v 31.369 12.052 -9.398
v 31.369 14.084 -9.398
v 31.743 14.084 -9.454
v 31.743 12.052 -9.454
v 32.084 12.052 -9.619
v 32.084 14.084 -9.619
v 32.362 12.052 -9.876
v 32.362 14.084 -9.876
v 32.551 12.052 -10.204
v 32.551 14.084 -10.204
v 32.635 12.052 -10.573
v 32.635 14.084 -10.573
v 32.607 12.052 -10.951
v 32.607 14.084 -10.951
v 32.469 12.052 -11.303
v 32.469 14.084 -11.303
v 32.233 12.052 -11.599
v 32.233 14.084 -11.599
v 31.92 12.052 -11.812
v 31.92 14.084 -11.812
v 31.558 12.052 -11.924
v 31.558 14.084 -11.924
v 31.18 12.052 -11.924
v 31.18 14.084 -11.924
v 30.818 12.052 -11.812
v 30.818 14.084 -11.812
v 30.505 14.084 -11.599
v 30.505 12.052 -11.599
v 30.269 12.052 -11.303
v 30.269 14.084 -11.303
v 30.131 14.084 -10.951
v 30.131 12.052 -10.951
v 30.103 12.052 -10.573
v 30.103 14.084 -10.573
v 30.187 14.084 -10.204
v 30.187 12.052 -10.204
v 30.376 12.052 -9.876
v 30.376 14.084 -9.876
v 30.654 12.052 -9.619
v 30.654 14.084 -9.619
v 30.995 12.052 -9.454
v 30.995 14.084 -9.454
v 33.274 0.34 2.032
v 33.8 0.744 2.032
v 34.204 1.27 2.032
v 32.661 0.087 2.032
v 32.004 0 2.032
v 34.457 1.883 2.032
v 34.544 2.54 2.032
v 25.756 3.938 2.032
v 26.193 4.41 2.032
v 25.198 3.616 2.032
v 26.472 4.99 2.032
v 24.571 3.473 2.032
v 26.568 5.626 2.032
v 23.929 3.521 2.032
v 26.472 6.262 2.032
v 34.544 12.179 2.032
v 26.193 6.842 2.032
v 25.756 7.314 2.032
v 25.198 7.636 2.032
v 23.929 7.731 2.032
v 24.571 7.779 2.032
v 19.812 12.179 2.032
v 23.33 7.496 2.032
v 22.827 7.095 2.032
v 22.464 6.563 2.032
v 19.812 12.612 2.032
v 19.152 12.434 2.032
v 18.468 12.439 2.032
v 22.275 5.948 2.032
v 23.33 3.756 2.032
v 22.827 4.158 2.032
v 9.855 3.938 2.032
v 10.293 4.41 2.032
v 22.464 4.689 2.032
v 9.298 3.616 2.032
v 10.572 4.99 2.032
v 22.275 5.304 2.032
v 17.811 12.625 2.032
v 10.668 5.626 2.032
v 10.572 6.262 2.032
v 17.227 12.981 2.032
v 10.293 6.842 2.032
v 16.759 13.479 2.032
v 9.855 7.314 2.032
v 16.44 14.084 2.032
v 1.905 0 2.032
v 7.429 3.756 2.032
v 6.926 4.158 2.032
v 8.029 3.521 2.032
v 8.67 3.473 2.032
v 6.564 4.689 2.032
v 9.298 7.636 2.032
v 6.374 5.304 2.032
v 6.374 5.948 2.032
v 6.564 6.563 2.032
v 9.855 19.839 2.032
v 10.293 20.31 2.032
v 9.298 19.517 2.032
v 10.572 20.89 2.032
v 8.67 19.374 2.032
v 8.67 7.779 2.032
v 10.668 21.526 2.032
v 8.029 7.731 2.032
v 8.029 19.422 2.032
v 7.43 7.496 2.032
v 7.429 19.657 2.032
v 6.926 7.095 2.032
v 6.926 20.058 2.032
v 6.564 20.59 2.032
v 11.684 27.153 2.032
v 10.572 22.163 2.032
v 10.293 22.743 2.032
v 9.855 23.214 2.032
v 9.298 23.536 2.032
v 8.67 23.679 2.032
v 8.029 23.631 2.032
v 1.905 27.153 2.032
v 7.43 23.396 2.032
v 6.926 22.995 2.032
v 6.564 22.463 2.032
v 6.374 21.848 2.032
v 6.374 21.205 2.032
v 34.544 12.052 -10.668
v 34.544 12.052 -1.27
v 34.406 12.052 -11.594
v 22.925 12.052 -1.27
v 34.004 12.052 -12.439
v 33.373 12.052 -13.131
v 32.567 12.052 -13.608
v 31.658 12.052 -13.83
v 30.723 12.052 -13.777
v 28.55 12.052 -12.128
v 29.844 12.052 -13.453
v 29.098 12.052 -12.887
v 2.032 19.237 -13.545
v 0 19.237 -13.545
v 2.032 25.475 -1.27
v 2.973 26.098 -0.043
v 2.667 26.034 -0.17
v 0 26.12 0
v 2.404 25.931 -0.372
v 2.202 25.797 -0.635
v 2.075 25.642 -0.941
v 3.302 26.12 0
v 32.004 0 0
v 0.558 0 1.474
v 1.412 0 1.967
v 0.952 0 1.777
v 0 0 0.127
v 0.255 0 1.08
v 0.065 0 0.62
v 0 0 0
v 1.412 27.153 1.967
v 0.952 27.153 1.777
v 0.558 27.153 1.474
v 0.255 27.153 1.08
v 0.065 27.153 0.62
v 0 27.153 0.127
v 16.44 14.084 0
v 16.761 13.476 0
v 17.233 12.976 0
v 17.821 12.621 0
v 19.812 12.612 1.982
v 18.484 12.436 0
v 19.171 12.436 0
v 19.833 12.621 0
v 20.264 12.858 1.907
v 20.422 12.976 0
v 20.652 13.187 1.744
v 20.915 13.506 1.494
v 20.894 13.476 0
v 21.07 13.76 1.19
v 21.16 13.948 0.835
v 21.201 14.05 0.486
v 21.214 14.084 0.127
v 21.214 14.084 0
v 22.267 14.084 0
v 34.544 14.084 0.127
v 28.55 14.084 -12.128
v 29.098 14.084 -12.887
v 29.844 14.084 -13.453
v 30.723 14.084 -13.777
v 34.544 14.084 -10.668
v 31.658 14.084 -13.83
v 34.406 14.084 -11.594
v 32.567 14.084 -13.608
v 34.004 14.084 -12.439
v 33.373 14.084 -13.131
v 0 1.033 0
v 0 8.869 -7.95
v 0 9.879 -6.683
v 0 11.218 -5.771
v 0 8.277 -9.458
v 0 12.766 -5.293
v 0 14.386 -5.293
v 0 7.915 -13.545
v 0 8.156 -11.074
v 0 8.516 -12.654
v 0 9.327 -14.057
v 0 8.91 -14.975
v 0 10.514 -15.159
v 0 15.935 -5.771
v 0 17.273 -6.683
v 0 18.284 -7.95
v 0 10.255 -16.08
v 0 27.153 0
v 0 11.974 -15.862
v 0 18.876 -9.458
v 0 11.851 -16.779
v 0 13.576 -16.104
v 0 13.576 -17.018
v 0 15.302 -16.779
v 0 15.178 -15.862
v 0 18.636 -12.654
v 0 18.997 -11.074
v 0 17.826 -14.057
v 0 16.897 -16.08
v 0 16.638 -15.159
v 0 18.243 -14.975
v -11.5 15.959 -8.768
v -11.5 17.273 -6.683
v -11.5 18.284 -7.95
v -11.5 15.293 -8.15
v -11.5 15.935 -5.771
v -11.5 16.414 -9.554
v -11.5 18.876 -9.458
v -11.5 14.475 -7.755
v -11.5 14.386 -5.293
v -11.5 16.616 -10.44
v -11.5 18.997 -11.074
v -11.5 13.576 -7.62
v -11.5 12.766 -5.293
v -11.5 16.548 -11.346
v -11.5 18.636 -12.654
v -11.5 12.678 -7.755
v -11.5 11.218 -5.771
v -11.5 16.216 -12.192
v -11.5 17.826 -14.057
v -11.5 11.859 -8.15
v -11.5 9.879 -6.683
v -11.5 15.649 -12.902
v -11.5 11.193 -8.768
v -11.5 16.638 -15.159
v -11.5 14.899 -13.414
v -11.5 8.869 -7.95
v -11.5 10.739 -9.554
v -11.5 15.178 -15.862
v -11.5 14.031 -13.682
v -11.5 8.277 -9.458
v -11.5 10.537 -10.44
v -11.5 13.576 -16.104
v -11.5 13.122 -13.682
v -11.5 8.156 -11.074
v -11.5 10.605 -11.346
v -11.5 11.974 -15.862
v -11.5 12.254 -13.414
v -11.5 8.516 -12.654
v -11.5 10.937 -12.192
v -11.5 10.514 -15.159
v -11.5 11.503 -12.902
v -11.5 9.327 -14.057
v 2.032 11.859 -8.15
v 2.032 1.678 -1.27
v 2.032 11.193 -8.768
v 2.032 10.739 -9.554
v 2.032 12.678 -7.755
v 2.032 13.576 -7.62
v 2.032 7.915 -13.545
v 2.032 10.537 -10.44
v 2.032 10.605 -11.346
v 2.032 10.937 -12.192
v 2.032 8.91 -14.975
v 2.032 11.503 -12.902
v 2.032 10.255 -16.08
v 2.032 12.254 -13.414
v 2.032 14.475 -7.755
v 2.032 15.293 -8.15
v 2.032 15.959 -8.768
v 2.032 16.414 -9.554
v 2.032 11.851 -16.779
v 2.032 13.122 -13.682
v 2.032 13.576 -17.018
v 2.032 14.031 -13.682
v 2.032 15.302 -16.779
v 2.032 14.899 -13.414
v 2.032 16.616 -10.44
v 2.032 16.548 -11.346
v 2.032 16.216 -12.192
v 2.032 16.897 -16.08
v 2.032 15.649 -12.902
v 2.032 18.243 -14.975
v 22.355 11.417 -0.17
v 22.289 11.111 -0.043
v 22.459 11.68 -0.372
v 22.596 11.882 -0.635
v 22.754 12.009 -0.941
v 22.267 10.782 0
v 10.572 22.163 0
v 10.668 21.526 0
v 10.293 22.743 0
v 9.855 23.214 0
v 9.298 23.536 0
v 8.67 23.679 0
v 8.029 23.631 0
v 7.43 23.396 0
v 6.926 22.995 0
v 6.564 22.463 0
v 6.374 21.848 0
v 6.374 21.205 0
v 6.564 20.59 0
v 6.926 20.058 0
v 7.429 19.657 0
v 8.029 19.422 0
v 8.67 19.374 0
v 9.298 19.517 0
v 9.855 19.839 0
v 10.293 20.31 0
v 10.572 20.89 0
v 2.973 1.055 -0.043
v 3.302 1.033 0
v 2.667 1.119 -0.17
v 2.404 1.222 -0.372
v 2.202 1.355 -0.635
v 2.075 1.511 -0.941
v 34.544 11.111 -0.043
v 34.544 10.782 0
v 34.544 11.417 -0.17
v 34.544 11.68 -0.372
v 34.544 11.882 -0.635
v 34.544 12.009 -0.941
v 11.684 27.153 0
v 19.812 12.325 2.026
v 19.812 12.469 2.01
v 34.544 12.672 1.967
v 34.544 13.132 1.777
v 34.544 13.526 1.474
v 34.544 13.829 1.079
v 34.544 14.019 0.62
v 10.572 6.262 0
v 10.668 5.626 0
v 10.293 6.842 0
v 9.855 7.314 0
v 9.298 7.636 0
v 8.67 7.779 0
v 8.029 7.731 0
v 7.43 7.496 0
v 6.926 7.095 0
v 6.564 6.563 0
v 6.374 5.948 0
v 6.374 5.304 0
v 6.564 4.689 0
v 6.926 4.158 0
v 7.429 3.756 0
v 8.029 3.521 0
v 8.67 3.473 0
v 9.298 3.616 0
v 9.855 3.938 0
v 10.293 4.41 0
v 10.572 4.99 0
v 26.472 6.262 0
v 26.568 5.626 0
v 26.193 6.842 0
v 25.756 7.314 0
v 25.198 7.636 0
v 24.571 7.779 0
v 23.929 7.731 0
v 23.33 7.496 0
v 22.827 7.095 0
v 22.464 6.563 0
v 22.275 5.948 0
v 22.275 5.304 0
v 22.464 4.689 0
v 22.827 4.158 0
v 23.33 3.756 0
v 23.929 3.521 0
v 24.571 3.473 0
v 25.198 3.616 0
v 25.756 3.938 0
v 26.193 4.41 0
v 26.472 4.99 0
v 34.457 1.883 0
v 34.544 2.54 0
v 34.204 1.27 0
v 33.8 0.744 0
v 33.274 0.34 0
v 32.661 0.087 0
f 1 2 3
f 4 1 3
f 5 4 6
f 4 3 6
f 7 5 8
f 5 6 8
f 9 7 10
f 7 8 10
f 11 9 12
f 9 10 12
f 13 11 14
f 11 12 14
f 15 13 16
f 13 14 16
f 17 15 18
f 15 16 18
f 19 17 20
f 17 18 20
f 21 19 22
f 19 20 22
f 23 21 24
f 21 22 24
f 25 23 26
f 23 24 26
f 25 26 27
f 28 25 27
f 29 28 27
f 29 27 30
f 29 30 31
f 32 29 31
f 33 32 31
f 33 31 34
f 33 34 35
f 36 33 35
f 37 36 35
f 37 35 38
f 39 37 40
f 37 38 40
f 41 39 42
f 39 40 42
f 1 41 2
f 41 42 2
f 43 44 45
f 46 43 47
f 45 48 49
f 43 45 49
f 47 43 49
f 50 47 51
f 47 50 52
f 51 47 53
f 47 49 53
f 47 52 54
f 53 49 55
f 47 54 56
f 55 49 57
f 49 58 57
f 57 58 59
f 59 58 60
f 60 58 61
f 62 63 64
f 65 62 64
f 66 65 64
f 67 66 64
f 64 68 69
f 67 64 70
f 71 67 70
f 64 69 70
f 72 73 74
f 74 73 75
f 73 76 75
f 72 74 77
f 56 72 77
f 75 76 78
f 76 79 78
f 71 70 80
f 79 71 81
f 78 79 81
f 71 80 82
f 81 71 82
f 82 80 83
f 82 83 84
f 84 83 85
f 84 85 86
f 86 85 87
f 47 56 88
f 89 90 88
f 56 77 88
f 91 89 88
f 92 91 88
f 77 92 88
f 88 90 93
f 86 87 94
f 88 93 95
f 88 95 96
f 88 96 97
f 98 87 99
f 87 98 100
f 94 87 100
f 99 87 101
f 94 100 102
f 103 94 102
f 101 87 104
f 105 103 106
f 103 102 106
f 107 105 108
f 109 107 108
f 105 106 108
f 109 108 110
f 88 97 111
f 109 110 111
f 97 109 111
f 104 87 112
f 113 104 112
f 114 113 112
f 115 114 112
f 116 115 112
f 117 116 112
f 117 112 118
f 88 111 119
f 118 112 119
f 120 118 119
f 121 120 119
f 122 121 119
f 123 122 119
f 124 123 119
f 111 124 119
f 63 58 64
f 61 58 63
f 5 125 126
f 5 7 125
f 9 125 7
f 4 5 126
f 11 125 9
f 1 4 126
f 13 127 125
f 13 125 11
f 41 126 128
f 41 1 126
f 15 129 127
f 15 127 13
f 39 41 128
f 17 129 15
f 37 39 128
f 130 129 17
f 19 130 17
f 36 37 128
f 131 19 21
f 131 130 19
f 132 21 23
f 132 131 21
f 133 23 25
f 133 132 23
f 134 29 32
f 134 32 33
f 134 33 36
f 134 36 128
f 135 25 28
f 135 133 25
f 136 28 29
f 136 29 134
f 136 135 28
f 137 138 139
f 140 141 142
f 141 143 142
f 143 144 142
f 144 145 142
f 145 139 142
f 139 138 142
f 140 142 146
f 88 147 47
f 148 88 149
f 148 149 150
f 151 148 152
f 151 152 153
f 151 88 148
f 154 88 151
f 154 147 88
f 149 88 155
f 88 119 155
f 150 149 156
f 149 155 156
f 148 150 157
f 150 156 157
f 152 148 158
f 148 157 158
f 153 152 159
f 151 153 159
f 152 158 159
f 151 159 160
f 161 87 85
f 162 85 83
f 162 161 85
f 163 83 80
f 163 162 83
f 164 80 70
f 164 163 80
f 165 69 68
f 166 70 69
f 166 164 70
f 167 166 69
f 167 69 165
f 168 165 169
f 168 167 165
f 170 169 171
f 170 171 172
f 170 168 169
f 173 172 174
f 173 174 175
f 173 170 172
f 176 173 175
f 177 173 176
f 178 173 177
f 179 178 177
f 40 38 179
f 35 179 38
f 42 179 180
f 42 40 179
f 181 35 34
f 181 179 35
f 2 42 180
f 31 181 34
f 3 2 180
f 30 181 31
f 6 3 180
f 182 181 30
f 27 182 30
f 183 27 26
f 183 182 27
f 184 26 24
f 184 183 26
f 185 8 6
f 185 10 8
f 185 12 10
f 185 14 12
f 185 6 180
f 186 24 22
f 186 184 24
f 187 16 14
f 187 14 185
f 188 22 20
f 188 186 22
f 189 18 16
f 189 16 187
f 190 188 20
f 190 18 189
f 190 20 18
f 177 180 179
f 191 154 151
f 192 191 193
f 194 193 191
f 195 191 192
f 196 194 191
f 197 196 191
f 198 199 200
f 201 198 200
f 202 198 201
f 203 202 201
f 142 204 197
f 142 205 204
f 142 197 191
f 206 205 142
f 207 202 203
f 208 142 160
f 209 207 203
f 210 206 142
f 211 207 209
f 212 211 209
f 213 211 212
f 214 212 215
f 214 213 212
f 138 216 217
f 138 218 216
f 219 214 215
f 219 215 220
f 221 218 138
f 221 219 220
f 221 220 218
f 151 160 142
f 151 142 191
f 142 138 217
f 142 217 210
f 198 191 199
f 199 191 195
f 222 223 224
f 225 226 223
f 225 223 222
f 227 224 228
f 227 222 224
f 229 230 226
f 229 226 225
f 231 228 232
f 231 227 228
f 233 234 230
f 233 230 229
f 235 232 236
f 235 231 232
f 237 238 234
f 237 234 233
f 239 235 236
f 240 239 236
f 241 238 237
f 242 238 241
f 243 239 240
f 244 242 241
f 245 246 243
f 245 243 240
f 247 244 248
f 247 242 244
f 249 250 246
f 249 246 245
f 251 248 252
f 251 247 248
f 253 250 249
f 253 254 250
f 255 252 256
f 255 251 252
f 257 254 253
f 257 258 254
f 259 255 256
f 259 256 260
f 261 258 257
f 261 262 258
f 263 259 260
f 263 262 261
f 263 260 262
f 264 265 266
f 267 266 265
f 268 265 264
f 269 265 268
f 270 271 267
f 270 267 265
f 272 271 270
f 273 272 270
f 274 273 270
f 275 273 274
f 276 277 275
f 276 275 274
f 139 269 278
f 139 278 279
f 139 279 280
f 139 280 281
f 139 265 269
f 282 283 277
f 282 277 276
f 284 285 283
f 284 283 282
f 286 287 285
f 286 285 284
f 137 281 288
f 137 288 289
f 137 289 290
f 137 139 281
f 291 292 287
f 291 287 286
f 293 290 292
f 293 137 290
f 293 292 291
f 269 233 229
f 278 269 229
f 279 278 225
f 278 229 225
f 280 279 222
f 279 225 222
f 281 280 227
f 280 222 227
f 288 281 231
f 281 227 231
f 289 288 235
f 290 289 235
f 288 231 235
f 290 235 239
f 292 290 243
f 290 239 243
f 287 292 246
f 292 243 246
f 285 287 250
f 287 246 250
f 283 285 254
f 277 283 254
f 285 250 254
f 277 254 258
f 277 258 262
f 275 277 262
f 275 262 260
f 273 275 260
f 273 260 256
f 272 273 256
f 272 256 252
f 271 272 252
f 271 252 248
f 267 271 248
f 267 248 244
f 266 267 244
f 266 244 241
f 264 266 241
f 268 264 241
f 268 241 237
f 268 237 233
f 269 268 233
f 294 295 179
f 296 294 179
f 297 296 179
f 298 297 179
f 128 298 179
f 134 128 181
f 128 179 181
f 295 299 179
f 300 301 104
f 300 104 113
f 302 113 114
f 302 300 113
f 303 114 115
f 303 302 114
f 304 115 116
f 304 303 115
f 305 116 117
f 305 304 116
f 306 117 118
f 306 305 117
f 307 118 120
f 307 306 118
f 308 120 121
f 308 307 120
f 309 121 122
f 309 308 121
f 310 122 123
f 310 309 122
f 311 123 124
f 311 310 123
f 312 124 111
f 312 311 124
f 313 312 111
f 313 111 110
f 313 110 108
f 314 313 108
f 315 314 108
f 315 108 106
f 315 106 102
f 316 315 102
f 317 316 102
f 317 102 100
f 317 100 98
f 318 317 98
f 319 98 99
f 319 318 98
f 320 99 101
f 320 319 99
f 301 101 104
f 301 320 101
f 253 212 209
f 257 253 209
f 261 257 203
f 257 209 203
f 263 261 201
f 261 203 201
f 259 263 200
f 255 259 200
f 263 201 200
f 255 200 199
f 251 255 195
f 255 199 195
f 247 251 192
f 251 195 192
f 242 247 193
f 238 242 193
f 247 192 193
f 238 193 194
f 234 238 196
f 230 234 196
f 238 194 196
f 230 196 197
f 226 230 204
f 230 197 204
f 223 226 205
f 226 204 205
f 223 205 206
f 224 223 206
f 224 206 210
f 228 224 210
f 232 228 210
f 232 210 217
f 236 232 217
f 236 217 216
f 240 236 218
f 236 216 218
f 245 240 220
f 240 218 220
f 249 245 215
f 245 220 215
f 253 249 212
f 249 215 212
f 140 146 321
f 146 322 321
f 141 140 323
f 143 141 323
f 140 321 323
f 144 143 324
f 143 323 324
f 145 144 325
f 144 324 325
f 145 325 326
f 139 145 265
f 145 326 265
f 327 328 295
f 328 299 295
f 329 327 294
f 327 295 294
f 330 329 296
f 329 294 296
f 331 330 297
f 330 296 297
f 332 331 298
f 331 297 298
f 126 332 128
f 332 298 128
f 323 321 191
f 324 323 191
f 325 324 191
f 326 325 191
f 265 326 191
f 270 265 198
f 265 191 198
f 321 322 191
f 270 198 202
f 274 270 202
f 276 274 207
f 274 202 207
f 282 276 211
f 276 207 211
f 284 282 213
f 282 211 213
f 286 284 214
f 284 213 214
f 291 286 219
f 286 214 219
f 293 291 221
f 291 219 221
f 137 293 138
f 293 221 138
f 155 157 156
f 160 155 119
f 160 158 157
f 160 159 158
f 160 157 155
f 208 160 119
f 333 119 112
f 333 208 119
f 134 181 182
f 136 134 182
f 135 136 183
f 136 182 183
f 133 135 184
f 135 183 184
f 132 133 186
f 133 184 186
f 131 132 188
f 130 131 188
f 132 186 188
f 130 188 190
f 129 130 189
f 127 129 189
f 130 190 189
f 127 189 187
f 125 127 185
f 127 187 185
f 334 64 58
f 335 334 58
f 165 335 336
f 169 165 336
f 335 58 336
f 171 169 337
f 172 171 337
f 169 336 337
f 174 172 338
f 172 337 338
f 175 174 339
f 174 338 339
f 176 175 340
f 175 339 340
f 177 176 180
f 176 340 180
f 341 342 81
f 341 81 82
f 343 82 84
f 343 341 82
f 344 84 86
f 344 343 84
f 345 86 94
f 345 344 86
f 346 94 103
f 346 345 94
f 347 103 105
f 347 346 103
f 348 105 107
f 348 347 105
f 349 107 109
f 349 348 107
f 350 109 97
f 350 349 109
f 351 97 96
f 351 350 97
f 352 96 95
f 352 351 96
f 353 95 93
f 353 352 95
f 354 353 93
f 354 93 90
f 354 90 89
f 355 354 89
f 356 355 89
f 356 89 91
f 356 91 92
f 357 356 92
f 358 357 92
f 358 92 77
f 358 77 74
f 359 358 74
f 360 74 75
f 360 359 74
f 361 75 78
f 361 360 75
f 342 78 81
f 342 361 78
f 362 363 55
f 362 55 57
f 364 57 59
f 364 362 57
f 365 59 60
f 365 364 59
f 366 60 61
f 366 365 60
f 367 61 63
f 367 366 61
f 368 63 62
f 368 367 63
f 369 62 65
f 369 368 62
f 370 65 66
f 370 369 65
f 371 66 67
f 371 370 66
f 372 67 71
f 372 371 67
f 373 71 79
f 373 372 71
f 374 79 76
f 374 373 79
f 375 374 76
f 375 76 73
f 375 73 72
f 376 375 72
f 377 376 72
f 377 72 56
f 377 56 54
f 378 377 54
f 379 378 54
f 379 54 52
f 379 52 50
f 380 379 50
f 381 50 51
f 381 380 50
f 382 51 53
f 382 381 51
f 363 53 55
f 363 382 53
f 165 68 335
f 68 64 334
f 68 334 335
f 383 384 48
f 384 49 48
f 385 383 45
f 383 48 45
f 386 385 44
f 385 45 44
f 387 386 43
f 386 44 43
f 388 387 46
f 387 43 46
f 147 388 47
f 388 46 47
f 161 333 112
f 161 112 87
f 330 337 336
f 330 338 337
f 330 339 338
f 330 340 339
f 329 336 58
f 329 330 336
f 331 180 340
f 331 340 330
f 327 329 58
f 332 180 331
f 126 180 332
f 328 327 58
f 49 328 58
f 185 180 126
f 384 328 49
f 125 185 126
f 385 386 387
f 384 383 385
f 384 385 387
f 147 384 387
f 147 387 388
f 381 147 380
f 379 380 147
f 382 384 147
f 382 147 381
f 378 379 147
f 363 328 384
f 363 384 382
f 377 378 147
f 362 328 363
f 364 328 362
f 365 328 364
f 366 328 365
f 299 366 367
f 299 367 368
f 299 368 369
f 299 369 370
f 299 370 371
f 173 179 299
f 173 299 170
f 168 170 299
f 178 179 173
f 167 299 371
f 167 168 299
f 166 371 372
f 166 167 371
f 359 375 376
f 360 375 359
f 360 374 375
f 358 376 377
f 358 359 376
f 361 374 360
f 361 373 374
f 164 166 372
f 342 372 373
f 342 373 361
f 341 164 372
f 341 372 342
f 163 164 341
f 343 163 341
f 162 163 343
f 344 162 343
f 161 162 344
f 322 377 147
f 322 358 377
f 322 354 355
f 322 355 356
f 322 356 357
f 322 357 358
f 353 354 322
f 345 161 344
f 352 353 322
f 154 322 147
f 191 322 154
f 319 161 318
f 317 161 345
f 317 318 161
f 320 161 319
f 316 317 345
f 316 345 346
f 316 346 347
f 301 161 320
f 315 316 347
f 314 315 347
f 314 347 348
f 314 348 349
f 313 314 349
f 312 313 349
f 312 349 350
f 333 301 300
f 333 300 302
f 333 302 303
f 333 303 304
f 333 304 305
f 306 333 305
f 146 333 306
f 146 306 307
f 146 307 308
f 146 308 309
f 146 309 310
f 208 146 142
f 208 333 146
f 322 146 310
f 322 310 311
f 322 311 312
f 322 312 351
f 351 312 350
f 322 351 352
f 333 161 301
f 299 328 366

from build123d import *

# Parameters (mm, degrees)
SKETCH1_R           = 2.159
BOSS_EXTRUDE1_DEPTH = 2.032
BOSS_EXTRUDE2_DEPTH = 2.032
SKETCH3_R           = 5.4356
BOSS_EXTRUDE3_DEPTH = 11.5
SKETCH4_R           = 3.048
CUT_EXTRUDE1_DEPTH  = 57.097468274
SKETCH5_R           = 1.27
BOSS_EXTRUDE4_DEPTH = 2.032
CUT_EXTRUDE2_DEPTH  = 14.732
FILLET4_R           = 1.905
FILLET5_R           = 1.27
FILLET6_R           = 2.54


with BuildPart() as part:
    # Sketch1 → Boss-Extrude1 (new body)
    with BuildSketch(Plane.XY):
        with BuildLine():
            Line((0, 0), (0, 27.1526))
            Line((0, 27.1526), (11.684, 27.1526))
            Line((11.684, 27.1526), (16.440472212, 14.0843))
            ThreePointArc((16.440472212, 14.0843), (18.827291469, 12.413031164), (21.214110726, 14.0843))
            Line((21.214110726, 14.0843), (34.544, 14.0843))
            Line((34.544, 14.0843), (34.544, 0))
            Line((34.544, 0), (0, 0))
        make_face()
        with Locations((8.509, 21.5265)):
            Circle(SKETCH1_R, mode=Mode.SUBTRACT)
        with Locations((8.509, 5.6261)):
            Circle(SKETCH1_R, mode=Mode.SUBTRACT)
        with Locations((24.4094, 5.6261)):
            Circle(SKETCH1_R, mode=Mode.SUBTRACT)
    extrude(amount=BOSS_EXTRUDE1_DEPTH)

    # Sketch2 → Boss-Extrude2 (add)
    with BuildSketch(Plane.ZY):
        with BuildLine():
            Line((2.032, 0), (-13.544651807, 7.915259956))
            ThreePointArc((-13.544651807, 7.915259956), (-17.018, 13.5763), (-13.544651807, 19.237340044))
            Line((-13.544651807, 19.237340044), (2.032, 27.1526))
            Line((2.032, 27.1526), (2.032, 0))
        make_face()
    extrude(amount=-BOSS_EXTRUDE2_DEPTH)

    # Sketch3 → Boss-Extrude3 (add)
    with BuildSketch(Plane.ZY):
        with Locations(Location((-10.668, 13.5763, 0), (0, 0, 180))):
            Circle(SKETCH3_R)
    extrude(amount=BOSS_EXTRUDE3_DEPTH)

    # Sketch4 → Cut-Extrude1 (cut, through all)
    with BuildSketch(Plane.ZY.offset(11.5)):
        with Locations((-10.668, 13.5763)):
            Circle(SKETCH4_R)
    extrude(amount=-CUT_EXTRUDE1_DEPTH, mode=Mode.SUBTRACT)

    # Sketch5 → Boss-Extrude4 (add)
    with BuildSketch(Plane(origin=(0, 14.0843, 0), x_dir=(1, 0, 0), z_dir=(0, 1, 0))):
        with BuildLine():
            Line((21.214110726, -2.032), (28.549831644, 12.128450197))
            ThreePointArc((28.549831644, 12.128450197), (32.120586811, 13.752759677), (34.544, 10.668))
            Line((34.544, 10.668), (34.544, -2.032))
            Line((34.544, -2.032), (21.214110726, -2.032))
        make_face()
        with Locations(Location((31.369, 10.668, 0), (0, 0, 270))):
            Circle(SKETCH5_R, mode=Mode.SUBTRACT)
    extrude(amount=-BOSS_EXTRUDE4_DEPTH)

    # Sketch6 → Cut-Extrude2 (cut)
    with BuildSketch(Plane(origin=(34.544, 0, 0), x_dir=(0, 0, -1), z_dir=(1, 0, 0))):
        with BuildLine():
            Line((-0.127, 14.0843), (-2.032, 14.0843))
            Line((-2.032, 14.0843), (-2.032, 12.1793))
            ThreePointArc((-2.032, 12.1793), (-1.474038418, 13.526338418), (-0.127, 14.0843))
        make_face()
    extrude(amount=-CUT_EXTRUDE2_DEPTH, mode=Mode.SUBTRACT)

    # Fillet4
    fillet4_edges = [part.edges().sort_by_distance(p)[0] for p in [
        (0, 13.5763, 2.032),
    ]]
    fillet(fillet4_edges, radius=FILLET4_R)

    # Fillet5
    fillet5_edges = [part.edges().sort_by_distance(p)[0] for p in [
        (2.032, 13.5763, 0),
        (28.405386966, 12.0523, 0),
    ]]
    fillet(fillet5_edges, radius=FILLET5_R)

    # Fillet6
    fillet6_edges = [part.edges().sort_by_distance(p)[0] for p in [
        (34.544, 0, 1.016),
    ]]
    fillet(fillet6_edges, radius=FILLET6_R)


solid = part.part
